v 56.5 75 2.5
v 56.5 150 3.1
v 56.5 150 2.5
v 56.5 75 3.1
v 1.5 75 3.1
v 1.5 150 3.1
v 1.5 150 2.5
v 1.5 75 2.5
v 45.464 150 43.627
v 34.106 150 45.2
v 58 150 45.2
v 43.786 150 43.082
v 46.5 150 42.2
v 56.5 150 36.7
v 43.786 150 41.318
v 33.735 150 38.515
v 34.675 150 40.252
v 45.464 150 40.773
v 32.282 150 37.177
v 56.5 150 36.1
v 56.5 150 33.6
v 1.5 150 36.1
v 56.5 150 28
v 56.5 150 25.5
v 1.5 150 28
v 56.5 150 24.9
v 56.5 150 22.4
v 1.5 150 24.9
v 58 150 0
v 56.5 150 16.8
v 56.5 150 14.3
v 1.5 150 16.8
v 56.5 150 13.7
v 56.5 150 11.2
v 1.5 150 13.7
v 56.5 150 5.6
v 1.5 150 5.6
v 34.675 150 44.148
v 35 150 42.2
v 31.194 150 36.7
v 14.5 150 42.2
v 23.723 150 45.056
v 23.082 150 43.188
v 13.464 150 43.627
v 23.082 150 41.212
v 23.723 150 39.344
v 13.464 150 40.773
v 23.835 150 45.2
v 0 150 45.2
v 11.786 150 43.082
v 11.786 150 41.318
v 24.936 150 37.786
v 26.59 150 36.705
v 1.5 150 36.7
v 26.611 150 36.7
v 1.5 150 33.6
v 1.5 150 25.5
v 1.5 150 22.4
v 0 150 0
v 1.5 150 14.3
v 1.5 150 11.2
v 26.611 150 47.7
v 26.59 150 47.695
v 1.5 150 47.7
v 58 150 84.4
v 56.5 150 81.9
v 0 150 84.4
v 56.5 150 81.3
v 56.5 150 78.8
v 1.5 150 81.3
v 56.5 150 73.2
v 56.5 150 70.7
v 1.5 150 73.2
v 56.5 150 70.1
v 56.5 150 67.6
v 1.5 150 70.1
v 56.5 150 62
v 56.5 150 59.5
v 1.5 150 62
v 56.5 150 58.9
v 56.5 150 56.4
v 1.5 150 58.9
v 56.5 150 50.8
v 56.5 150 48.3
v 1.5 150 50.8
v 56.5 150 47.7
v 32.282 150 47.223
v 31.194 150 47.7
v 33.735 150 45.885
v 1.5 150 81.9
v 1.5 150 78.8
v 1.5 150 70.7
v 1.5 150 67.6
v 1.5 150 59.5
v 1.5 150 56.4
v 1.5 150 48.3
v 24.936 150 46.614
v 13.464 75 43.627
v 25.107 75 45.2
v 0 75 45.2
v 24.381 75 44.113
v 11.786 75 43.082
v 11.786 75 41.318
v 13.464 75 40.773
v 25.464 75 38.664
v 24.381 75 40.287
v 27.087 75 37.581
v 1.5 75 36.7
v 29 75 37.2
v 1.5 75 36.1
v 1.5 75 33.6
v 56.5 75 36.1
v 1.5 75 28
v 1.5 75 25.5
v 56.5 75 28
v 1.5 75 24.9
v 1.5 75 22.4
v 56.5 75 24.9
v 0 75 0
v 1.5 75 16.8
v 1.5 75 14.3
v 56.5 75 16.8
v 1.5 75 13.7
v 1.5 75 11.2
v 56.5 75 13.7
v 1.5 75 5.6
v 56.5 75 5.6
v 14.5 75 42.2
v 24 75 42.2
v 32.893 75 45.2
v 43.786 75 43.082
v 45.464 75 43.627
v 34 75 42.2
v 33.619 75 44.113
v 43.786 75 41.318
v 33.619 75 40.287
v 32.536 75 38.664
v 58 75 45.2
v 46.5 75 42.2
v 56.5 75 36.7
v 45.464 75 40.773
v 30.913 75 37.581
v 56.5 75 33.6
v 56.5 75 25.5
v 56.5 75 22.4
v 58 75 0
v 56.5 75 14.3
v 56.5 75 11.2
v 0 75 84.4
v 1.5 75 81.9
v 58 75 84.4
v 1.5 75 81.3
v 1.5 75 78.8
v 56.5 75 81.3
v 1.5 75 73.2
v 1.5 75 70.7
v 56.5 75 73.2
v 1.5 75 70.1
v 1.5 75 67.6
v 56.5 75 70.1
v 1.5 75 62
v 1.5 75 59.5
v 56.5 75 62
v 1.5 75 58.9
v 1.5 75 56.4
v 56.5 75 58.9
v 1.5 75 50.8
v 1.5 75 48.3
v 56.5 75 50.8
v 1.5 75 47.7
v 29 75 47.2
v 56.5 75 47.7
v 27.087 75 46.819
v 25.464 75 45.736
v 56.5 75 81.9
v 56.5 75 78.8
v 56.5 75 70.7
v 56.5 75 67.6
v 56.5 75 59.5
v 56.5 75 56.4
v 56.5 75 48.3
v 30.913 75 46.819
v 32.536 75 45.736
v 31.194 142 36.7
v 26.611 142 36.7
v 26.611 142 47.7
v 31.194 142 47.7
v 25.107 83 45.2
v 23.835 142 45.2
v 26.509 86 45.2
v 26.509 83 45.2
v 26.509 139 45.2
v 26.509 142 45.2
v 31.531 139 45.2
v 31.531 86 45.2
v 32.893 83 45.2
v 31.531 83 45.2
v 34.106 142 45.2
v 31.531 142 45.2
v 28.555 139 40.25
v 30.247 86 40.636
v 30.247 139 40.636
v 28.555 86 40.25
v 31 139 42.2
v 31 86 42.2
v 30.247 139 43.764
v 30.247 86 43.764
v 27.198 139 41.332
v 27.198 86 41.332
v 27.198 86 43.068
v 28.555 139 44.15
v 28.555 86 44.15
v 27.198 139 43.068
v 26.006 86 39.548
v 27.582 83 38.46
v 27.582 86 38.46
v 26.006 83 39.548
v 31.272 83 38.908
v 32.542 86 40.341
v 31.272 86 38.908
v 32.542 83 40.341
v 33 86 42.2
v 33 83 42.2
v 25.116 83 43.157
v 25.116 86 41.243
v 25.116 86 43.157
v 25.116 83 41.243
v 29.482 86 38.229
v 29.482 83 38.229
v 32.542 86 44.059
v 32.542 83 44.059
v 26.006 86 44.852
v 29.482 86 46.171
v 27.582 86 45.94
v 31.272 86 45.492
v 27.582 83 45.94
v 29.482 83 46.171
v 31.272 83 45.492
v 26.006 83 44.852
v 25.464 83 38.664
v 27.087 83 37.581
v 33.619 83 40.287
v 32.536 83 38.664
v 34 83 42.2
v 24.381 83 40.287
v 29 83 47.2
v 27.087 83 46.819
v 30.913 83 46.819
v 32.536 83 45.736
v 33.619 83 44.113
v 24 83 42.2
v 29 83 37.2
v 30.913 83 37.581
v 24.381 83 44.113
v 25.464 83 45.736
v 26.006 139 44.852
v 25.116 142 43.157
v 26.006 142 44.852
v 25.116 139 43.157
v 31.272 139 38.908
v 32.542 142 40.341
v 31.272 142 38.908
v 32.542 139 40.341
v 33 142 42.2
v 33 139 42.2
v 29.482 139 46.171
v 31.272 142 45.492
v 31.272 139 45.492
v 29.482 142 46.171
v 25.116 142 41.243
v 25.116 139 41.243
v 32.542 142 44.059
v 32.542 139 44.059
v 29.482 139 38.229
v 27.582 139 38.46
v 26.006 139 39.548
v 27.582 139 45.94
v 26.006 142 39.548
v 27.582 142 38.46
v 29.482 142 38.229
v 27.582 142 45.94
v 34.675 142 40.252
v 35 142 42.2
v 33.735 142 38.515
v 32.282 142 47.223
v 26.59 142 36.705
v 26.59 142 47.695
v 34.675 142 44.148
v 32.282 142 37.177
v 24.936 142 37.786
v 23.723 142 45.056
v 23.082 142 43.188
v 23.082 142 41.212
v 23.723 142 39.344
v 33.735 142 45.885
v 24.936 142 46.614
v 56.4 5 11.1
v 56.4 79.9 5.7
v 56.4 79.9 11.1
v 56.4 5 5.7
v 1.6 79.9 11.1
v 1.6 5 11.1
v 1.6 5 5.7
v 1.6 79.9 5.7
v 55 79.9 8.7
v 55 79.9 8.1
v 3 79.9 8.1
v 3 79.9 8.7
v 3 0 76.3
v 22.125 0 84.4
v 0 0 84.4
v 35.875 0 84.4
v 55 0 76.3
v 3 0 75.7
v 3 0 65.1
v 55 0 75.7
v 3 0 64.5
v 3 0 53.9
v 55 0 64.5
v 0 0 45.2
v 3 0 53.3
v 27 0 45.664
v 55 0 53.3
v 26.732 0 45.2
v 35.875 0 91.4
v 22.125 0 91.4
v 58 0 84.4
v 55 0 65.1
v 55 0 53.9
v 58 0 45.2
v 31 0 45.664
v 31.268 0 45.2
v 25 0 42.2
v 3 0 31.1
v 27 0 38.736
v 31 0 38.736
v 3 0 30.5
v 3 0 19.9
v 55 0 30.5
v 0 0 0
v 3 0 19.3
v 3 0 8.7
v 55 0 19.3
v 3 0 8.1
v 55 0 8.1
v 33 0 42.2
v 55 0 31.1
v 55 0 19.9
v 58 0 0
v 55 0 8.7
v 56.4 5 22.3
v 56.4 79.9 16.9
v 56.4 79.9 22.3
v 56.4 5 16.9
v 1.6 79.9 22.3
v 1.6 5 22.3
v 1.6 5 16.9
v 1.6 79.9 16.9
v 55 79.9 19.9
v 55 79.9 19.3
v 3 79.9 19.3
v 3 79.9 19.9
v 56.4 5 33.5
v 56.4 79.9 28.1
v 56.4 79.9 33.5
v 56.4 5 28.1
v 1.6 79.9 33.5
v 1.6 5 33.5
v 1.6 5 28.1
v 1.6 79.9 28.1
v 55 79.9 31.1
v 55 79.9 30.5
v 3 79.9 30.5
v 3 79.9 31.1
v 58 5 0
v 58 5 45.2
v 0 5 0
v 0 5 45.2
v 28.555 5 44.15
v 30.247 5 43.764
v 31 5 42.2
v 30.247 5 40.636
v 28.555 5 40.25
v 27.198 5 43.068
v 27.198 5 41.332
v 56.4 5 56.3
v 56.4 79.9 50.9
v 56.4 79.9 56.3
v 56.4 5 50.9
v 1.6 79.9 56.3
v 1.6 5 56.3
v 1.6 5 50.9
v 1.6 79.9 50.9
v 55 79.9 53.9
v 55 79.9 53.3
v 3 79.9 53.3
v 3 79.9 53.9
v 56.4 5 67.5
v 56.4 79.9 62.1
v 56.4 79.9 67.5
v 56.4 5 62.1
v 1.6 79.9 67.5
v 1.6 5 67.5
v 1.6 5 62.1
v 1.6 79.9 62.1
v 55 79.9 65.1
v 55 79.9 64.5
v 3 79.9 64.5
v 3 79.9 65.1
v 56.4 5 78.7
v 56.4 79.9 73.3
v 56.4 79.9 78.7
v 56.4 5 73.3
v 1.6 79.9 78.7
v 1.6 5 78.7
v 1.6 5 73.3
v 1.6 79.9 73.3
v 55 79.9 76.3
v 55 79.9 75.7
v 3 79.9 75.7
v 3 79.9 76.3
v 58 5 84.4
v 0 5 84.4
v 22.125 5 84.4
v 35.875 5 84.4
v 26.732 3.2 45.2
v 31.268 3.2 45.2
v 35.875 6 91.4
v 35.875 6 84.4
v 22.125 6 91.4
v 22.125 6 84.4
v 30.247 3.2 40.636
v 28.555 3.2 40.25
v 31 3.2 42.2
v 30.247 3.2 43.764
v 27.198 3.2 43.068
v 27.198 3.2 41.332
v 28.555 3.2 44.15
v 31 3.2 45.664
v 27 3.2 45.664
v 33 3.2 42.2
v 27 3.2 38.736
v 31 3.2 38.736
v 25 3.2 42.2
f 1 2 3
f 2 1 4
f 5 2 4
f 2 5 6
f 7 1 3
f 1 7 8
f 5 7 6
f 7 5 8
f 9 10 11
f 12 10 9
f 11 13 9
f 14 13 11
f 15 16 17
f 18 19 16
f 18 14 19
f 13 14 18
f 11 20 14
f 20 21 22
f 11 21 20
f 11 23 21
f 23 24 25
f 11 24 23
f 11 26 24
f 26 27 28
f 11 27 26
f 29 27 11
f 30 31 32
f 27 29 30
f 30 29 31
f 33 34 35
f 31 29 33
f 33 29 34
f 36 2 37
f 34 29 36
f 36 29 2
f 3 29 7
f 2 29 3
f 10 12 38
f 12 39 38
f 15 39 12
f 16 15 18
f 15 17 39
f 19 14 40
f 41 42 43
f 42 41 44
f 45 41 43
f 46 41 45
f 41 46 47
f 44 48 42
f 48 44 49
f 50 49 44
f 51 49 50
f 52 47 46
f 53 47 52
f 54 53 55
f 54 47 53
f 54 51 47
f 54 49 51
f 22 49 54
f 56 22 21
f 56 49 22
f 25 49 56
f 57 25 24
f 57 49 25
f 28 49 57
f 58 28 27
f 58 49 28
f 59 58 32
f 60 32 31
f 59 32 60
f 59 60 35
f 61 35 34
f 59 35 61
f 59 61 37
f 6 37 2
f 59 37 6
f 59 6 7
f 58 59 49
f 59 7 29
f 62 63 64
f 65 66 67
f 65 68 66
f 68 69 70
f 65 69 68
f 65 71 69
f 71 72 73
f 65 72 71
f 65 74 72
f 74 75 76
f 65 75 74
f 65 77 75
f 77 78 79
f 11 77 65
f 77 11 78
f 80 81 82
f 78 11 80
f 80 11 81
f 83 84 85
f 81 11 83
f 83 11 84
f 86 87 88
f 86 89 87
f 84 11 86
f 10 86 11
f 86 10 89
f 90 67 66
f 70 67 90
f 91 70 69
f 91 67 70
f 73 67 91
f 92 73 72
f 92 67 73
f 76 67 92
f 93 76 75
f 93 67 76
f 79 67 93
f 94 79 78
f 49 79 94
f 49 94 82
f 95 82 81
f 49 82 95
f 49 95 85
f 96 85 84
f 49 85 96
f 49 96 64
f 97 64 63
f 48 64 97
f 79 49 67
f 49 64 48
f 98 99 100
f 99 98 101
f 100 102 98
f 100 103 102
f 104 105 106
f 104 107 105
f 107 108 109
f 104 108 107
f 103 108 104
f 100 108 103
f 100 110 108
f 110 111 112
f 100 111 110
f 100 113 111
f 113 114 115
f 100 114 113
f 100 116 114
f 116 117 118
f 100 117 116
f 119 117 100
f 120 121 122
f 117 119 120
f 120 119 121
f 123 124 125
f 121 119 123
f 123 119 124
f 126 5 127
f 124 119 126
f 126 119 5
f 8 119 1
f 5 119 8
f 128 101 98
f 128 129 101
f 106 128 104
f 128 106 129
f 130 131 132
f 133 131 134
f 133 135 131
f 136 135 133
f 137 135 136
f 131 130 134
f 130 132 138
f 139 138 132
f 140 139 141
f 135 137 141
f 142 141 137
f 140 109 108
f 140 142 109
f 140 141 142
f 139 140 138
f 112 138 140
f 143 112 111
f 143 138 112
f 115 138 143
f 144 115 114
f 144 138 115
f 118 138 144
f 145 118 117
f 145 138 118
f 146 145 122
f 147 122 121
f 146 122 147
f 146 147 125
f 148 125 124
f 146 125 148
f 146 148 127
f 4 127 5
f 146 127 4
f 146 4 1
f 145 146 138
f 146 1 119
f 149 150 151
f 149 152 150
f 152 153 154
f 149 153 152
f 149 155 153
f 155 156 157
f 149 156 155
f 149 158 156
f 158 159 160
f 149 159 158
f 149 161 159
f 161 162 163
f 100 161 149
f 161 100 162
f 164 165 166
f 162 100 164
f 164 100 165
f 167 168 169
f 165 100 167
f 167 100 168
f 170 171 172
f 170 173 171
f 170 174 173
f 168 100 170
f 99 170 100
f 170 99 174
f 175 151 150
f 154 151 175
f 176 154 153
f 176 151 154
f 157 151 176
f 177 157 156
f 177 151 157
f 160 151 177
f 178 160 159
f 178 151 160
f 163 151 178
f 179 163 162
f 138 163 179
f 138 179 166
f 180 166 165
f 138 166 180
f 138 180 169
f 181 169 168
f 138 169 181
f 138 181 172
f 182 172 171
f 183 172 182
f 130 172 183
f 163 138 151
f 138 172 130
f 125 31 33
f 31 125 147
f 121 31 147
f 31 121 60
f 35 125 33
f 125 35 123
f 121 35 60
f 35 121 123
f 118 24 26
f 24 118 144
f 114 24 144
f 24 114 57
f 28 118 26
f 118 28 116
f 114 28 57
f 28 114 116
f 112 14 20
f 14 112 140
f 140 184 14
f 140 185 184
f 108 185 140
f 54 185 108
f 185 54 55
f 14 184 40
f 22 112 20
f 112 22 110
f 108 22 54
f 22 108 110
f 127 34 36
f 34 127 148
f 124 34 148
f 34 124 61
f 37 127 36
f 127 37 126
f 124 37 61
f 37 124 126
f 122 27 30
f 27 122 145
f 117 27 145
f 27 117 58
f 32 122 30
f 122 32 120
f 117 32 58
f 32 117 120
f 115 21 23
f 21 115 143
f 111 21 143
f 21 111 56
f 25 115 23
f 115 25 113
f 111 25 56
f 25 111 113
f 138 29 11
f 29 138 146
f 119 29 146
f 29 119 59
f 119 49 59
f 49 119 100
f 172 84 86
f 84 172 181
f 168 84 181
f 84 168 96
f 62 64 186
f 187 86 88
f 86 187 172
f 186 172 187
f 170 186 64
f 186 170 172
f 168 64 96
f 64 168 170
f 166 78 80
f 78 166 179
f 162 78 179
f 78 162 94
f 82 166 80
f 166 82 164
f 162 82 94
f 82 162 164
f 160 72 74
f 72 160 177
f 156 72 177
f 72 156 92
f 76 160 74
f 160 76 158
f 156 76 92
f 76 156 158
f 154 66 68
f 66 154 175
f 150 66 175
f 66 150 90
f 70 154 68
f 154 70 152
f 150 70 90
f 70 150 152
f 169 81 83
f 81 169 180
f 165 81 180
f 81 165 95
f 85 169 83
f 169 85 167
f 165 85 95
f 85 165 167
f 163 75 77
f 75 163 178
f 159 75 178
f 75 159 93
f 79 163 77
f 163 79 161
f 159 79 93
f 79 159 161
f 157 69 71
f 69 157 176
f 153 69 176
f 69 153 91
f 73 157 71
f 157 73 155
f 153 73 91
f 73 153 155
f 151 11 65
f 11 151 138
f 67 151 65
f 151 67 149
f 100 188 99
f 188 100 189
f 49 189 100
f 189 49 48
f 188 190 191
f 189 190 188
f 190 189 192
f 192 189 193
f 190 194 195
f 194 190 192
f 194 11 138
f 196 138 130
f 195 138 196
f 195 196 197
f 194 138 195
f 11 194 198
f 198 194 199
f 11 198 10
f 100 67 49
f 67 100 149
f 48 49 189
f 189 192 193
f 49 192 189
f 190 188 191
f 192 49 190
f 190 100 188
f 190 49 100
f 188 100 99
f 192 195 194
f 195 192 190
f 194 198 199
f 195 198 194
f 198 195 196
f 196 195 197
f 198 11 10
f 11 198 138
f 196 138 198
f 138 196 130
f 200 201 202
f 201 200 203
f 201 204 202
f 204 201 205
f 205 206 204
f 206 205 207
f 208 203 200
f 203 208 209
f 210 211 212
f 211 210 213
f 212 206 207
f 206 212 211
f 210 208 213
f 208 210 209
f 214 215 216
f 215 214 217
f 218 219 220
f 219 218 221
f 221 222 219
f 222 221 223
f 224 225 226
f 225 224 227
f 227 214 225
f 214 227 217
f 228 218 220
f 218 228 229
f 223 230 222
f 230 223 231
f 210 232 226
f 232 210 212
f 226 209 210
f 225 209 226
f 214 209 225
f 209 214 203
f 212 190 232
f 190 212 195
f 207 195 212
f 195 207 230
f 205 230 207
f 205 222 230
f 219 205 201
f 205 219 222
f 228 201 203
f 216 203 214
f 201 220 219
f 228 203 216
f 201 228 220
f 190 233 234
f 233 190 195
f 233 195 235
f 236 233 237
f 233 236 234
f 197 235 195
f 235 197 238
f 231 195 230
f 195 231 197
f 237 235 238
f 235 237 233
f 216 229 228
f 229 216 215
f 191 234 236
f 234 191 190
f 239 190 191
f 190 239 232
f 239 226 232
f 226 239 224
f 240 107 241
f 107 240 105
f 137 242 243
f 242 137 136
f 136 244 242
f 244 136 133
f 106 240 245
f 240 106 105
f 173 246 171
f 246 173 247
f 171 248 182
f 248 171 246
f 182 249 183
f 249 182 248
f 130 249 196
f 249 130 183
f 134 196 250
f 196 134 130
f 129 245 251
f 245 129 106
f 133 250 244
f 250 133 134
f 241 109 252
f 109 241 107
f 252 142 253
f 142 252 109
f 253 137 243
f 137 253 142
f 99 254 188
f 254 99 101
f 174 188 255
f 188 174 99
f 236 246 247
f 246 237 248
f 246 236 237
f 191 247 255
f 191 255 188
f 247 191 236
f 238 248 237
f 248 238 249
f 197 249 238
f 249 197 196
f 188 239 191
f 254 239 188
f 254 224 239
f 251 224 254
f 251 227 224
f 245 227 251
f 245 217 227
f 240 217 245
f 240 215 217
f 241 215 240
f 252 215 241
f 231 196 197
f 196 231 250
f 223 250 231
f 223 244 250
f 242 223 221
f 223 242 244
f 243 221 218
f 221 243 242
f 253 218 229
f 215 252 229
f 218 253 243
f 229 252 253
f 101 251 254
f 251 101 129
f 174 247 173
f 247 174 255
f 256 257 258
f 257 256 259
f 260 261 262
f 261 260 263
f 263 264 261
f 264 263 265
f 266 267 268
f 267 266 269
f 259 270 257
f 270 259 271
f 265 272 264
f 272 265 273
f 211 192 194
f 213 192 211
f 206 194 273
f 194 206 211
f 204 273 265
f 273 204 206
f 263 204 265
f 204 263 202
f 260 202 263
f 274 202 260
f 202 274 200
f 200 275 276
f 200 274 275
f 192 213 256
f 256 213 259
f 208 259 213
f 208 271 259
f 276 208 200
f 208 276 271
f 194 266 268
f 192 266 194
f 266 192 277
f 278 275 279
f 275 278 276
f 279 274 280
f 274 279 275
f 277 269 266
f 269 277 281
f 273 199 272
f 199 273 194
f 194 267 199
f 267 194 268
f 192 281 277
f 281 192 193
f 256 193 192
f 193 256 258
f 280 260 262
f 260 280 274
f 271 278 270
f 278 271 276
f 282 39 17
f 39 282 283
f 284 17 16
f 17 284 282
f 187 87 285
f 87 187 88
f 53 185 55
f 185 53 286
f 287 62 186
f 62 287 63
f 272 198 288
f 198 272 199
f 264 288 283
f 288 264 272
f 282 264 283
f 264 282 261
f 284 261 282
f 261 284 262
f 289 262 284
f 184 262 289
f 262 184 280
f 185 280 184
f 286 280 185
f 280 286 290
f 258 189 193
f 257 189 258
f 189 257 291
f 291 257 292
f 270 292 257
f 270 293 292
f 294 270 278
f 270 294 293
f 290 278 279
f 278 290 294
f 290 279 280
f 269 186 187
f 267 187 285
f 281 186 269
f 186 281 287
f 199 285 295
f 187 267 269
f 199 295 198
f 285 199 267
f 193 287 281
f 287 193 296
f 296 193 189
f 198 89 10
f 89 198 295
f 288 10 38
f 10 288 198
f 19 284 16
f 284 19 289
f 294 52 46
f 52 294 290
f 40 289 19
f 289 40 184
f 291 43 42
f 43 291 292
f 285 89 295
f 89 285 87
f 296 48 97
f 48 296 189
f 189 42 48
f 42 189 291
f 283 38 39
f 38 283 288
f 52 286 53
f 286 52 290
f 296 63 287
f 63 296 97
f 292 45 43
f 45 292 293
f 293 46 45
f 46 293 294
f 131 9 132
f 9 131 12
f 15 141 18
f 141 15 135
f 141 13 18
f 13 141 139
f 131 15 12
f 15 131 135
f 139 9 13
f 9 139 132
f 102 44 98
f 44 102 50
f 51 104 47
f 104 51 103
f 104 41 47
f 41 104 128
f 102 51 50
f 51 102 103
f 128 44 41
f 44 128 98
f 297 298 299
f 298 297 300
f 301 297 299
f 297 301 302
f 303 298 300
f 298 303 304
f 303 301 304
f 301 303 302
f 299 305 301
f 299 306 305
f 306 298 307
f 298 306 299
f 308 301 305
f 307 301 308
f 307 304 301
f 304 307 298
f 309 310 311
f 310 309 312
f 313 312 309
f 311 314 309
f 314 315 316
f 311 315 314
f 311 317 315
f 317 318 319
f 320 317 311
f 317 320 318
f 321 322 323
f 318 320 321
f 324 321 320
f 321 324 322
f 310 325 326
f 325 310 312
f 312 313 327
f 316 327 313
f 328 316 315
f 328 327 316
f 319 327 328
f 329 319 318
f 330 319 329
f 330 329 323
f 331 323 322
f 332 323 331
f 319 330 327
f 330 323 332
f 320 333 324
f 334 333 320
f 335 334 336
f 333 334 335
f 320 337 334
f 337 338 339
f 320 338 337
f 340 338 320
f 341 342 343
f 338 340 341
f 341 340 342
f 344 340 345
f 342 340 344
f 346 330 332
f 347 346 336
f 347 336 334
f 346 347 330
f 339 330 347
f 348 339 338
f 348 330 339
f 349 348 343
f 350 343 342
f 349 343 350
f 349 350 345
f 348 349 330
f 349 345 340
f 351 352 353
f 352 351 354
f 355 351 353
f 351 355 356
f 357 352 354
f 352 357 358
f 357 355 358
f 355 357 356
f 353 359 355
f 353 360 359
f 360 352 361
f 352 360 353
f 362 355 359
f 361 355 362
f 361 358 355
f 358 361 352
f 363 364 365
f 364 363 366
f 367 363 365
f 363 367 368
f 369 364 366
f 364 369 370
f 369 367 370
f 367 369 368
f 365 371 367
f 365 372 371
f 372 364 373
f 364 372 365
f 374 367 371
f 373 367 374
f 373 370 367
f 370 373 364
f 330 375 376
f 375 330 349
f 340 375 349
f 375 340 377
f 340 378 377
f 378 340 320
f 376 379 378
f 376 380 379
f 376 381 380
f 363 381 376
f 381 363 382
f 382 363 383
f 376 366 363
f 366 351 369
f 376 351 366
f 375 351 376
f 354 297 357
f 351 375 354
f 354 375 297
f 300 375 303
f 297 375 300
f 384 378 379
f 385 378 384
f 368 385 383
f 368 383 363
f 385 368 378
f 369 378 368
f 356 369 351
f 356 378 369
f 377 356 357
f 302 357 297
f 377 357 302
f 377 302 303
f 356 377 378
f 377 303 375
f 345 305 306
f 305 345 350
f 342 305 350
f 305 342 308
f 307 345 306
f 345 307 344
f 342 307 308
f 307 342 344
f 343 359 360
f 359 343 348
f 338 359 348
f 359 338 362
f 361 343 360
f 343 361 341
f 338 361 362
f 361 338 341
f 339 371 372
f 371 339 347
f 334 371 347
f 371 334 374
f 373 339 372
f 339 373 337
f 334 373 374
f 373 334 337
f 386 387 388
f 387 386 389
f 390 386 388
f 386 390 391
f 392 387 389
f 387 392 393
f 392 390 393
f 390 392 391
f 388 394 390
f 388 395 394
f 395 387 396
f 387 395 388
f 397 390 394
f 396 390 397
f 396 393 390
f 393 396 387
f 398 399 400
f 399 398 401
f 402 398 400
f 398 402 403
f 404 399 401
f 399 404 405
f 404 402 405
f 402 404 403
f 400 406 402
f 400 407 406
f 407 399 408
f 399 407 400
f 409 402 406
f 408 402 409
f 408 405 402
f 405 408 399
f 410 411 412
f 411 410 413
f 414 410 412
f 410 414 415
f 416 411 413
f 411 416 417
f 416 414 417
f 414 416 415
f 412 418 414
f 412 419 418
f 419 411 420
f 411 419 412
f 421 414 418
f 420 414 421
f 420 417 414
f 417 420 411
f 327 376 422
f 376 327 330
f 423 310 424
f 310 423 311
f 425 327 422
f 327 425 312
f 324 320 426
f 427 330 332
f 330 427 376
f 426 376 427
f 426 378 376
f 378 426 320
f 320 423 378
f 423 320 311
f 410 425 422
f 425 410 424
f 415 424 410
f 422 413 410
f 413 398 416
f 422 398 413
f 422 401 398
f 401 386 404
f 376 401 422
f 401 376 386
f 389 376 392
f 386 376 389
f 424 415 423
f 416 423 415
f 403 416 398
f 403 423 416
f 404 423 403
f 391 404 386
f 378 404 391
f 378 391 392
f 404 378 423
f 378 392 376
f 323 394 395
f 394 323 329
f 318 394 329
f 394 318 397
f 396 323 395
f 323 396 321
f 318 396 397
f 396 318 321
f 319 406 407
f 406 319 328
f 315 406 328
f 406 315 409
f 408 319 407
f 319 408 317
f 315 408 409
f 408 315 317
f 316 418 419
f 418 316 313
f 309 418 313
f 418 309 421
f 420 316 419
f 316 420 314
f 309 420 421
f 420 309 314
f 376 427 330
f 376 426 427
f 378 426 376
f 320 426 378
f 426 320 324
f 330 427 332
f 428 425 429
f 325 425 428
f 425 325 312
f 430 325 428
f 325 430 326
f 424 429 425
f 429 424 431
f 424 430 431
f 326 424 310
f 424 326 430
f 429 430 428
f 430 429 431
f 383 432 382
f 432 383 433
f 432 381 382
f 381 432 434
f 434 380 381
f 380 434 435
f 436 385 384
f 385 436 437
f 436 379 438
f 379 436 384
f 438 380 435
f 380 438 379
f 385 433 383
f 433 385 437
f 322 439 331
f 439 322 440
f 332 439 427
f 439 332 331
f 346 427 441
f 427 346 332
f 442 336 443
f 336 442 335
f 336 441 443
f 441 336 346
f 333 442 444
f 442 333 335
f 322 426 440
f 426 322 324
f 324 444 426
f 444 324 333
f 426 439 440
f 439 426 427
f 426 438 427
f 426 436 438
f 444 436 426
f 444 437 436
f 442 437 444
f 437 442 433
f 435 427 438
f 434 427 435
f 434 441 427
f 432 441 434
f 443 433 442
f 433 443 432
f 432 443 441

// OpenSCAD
/* [Main Parameters] */

// count of all plates in capacitor
plate_count_ = 13;           // [3, 5, 7, 9, 11, 13, 15, 17, 19, 21, 23, 25]

// distance between rotor and stator capacitor plates in mm
plate_distance_ = 5;         // [2, 3, 4, 5, 6, 7, 8]

// capacitor plate width
plate_width_ = 55;

// capacitor plate height
plate_depth_ = 75;

// capacitor plate hole height, use larger value to make some room
plate_height_ = 0.6;

// gap between rotor and stator, tune for smoother sliding by printing tiny capacitor first, use acetone bath!
sliding_gap_ = 0.1;

// capacitor element to generate
generate_element_ = "stator";       // [stator, rotor]

// generate both stator and rotor for demo purposes?
generate_both_demo_ = "yes";        // [yes, no]

// enable worm gear system?
enable_worm_gear_ = "yes";          // [yes, no]

// enable button pusher?
enable_rotor_button_pusher_ = "yes";    // [yes, no]

/* [Worm Gear Parameters] */

// how much space to provide for worm gear system
worm_gear_gap_ = 6;

// worm shaft radius, change if use other than M4 shaft
worm_shaft_radius_ = 2;     // [1, 1.5, 2, 2.5, 3]

// bearing outer radius
bearing_radius_ = 4;

// bearing size depth/height
bearing_depth_ = 3;

// hole for screws, use larger diameter so tool will fit
screw_hole_radius_ = 6;

// depth of hole for screw, change based on shaft, number of nuts
screw_hole_depth_ = 8;

// hole sizes for stepper holder screws
holder_screw_radius_ = 1.5;

// distance from the shaft to the the motor holding screws
holder_screw_center_distance_ = 16;

// height of rotor button pusher    
button_pusher_height_ = 7;

// hole depth for holding nut on the rotor, change based on shaft, M3/M4/etc
nut_cutout_depth_ = 3.2;

// holding nut radius on the rotor, change based on shaft, M3/M4/etc
nut_cutout_radius_ = 4;
    
/* [Advanced Parameters] */

// gap between plate edge and stator edge
plate_width_guard_ = 1.5;

// depth of rotor base plate
rotor_base_plate_depth_ = 5;

assert(plate_count_ % 2 == 1, "Plate count must be an odd number");

echo("maximum capacitance: ~", capacitor_value_pf(plate_width_, plate_depth_, plate_count_, plate_distance_), "pF");
echo("breakdown voltage for air: ", breakdown_voltage_kv(3, plate_distance_), "kV");
echo("breakdown voltage for PETG: ", breakdown_voltage_kv(4.5, plate_distance_), "kV");

if (enable_worm_gear_ == "yes")
{
    assert(plate_count_ % 4 == 1, "Wrong plate count, must be one of [5, 9, 13, 17, 21, 25]");
    capacitor_with_worm_gear(plate_count_, plate_distance_, plate_width_, 
        plate_depth_, plate_height_, sliding_gap_, generate_element_, 
        generate_both_demo_, worm_gear_gap_, enable_rotor_button_pusher_);
} else 
{
    capacitor_naked(plate_count_, plate_distance_, plate_width_, 
        plate_depth_, plate_height_, sliding_gap_, generate_element_, generate_both_demo_);
}

// calculate capacitor breakdown voltage
function breakdown_voltage_kv(breakdown_voltage_mm, plate_distance) = plate_distance * breakdown_voltage_mm;

// calculate ~20% infill PETG filament approximate capacitor value from dimensions in mm and plate count
function capacitor_value_pf(plate_width, plate_depth, plate_count, plate_distance) =
    let (dielectric_constant = 1.55, electrostatic_constant = 8.854e-12)
        (plate_count - 1) * dielectric_constant * electrostatic_constant * plate_width * plate_depth / plate_distance * 1e9;

// generate capacitor with worm gear
module capacitor_with_worm_gear(plate_count, plate_distance, plate_width, 
    plate_depth, plate_height, sliding_gap, generate_element, generate_both_demo, 
    worm_gear_gap, enable_rotor_button_pusher)
{
    if (generate_element == "stator" || generate_both_demo == "yes") 
    {
        translate([0, 75, 0])
            capacitor_stator_with_worm_gear(plate_count, plate_distance, 
                plate_width, plate_depth, plate_height, worm_gear_gap);
    }
    if (generate_element == "rotor" || generate_both_demo == "yes") 
    {
        color("green")
            capacitor_rotor_with_worm_gear(plate_count, plate_distance, 
                plate_width, plate_depth, plate_height, sliding_gap, worm_gear_gap, enable_rotor_button_pusher);
    }
}

// generate capacitor
module capacitor_naked(plate_count, plate_distance, plate_width, 
    plate_depth, plate_height, sliding_gap, generate_element, generate_both_demo)
{
    if (generate_element == "stator" || generate_both_demo == "yes") 
    {
        translate([0, 50, 0])
            capacitor_stator(plate_count, plate_distance, 
                plate_width, plate_depth, plate_height);
    }
    if (generate_element == "rotor" || generate_both_demo == "yes") 
    {
        color("green")
            capacitor_rotor(plate_count, plate_distance, 
                plate_width, plate_depth, plate_height, sliding_gap);
    }
}

// generate stator with worm gear support
module capacitor_stator_with_worm_gear(plate_count, plate_distance, 
    plate_width, plate_depth, plate_height, worm_gear_gap)
{
    plate_width_guard = plate_width_guard_;
    worm_shaft_radius = worm_shaft_radius_;
    bearing_radius = bearing_radius_;
    bearing_depth = bearing_depth_;
    screw_hole_radius = screw_hole_radius_;
    screw_hole_depth = screw_hole_depth_;
    holder_screw_radius = holder_screw_radius_;
    holder_screw_center_distance = holder_screw_center_distance_;
    
    holder_screw_depth = plate_depth;
    bearing_full_depth = bearing_depth + screw_hole_depth;
    half_plate_count = ceil(plate_count / 2.0);
    box_height = half_plate_count * (plate_distance + plate_height);
    box_height_center = box_height + worm_gear_gap / 2.0;
    box_width_center = plate_width / 2.0 + plate_width_guard;
    
    difference()
    {
        // stator body with holes
        union()
        {
            // two split capacitor stators
            translate([0, 0, 0])
                capacitor_stator(half_plate_count, plate_distance, plate_width, plate_depth, plate_height);
            translate([0, 0, box_height + worm_gear_gap])
                capacitor_stator(half_plate_count, plate_distance, plate_width, plate_depth, plate_height);
            
            // worm gear blade hole
            translate([0, 0, box_height])
                cube([plate_width + 2 * plate_width_guard, plate_depth, worm_gear_gap]);
        }
        
        // worm gear system
        translate([plate_width / 2.0 + plate_width_guard, 0, box_height_center])
            rotate([-90, 0, 0])
                union() 
                {
                    cylinder(plate_depth, r=worm_shaft_radius);
                    cylinder(bearing_full_depth, r=bearing_radius);
                    cylinder(screw_hole_depth, r=bearing_radius + 1);
                }
        translate([box_width_center, plate_depth - bearing_full_depth, box_height_center])
            rotate([-90, 0, 0])
                cylinder(bearing_full_depth, r=bearing_radius);
        translate([box_width_center, plate_depth - screw_hole_depth, box_height_center])
            rotate([-90, 0, 0])
                cylinder(screw_hole_depth, r=screw_hole_radius);

        // holder holes
        translate([box_width_center + holder_screw_center_distance, plate_depth - holder_screw_depth, box_height_center])
            rotate([-90, 0, 0])
                cylinder(holder_screw_depth, r=holder_screw_radius);
        translate([box_width_center - holder_screw_center_distance, plate_depth - holder_screw_depth, box_height_center])
            rotate([-90, 0, 0])
                cylinder(holder_screw_depth, r=holder_screw_radius);
    }
}

// generate rotor with worm gear support
module capacitor_rotor_with_worm_gear(plate_count, plate_distance, 
    plate_width, plate_depth, plate_height, sliding_gap, 
    worm_gear_gap, enable_rotor_button_pusher)
{
    plate_width_guard = plate_width_guard_;
    worm_shaft_radius = worm_shaft_radius_;
    base_plate_width = rotor_base_plate_depth_;
    nut_cutout_depth = nut_cutout_depth_;
    nut_cutout_radius = nut_cutout_radius_;
    button_pusher_height = button_pusher_height_;

    half_plate_count = ceil(plate_count / 2.0);
    
    box_height = half_plate_count * (plate_distance + plate_height);
    box_height_center = box_height + worm_gear_gap / 2.0;
    box_width_center = plate_width / 2.0 + plate_width_guard;
    
    button_pusher_height_pos = 2 * box_height + worm_gear_gap;
    button_pusher_width = plate_width / 4.0;
    button_pusher_width_center = box_width_center - button_pusher_width / 2.0;
    button_pusher_depth = worm_gear_gap;

    difference()
    {
        // rotor body with blades
        union()
        {
            // two split capacitor rotors
            translate([0, 0, 0])
                capacitor_rotor(half_plate_count, plate_distance, plate_width, 
                    plate_depth, plate_height, sliding_gap);
            translate([0, 0, box_height + worm_gear_gap])
                capacitor_rotor(half_plate_count, plate_distance, plate_width, 
                    plate_depth, plate_height, sliding_gap);
            
            // worm gear blade
            translate([0, 0, box_height])
                cube([plate_width + 2 * plate_width_guard, base_plate_width, worm_gear_gap]);

            if (enable_rotor_button_pusher == "yes") 
            {
                translate([button_pusher_width_center, 0, button_pusher_height_pos])
                    cube([button_pusher_width, button_pusher_depth, button_pusher_height]);
            }
        }

        // worm gear hole
        translate([box_width_center, 0, box_height_center])
            rotate([-90, 0, 0])
                cylinder(base_plate_width, r=worm_shaft_radius);

        // nut cutout
        translate([box_width_center, 0, box_height_center])
            rotate([-90, 0, 0])
                cylinder(r=nut_cutout_radius, h=nut_cutout_depth, $fn=6);
    }
}

// generate sliding capacitor stator
module capacitor_stator(plate_count, plate_distance, plate_width, plate_depth, plate_height) 
{
    plate_width_guard = plate_width_guard_;

    // calculated dimensions
    box_width = plate_width + (plate_width_guard * 2);
    box_depth = plate_depth;
    box_height = plate_count * plate_distance + plate_count * plate_height;

    echo("stator dimensions:", box_width, box_depth, box_height);

    stator_plate_count = ceil(plate_count / 2.0);
    stator_plate_distance = 2 * (plate_distance + plate_height);
    stator_plate_initial_height = plate_distance / 2.0;

    echo("stator plates:", stator_plate_distance, stator_plate_initial_height);

    stator_hole_count = floor(plate_count / 2.0);
    stator_hole_distance = stator_plate_distance;
    stator_hole_initial_height = plate_distance + plate_height;
    stator_hole_height = plate_distance + plate_height;

    echo("stator holes:", stator_hole_distance, stator_hole_initial_height);

    difference() 
    {
        // stator body
        cube([box_width, box_depth, box_height]);

        // holes for plates
        for (plate_num = [0:stator_plate_count - 1]) 
        {
            translate([plate_width_guard, 0, plate_num * stator_plate_distance + stator_plate_initial_height])
                cube([plate_width, plate_depth, plate_height]);
        }
        
        // holes for rotor blades
        for (plate_num = [0:stator_hole_count - 1]) 
        {
            translate([plate_width_guard, 0, plate_num * stator_hole_distance + stator_hole_initial_height])
                cube([plate_width, plate_depth, stator_hole_height]);
        }
    }
}

// generate sliding capacitor rotor
module capacitor_rotor(plate_count, plate_distance, plate_width, plate_depth, plate_height, sliding_gap) 
{
    plate_width_guard = plate_width_guard_;

    // calculated dimensions
    box_width = plate_width + (plate_width_guard * 2);
    box_depth = rotor_base_plate_depth_;
    box_height = plate_count * plate_distance + plate_count * plate_height;

    echo("rotor dimensions:", box_width, box_depth, box_height);

    rotor_plate_count = ceil(plate_count / 2.0);
    rotor_plate_distance = 2 * (plate_distance + plate_height);
    rotor_plate_initial_height = plate_distance + plate_height + plate_distance / 2.0;

    echo("rotor plates:", rotor_plate_distance, rotor_plate_initial_height);

    rotor_blade_count = floor(plate_count / 2.0);
    rotor_blade_distance = rotor_plate_distance;
    rotor_blade_initial_height = plate_distance + plate_height + sliding_gap;
    rotor_blade_height = plate_distance + plate_height - 2 * sliding_gap;

    echo("rotor blades:", rotor_blade_distance, rotor_blade_initial_height);

    difference() 
    {
        // rotor body
        union() 
        {
            // rotor base plate
            cube([box_width, box_depth, box_height]);
            
            // rotor blades
            for (plate_num = [0:rotor_blade_count - 1]) 
            {
                translate([plate_width_guard + sliding_gap, 0, plate_num * rotor_blade_distance + rotor_blade_initial_height])
                    cube([plate_width - 2 * sliding_gap, plate_depth + box_depth - sliding_gap, rotor_blade_height]);
            }
        }
        
        // rotor plates 
        for (plate_num = [0:rotor_plate_count - 1]) 
        {
            translate([2 * plate_width_guard, 0, plate_num * rotor_plate_distance + rotor_plate_initial_height])
                cube([plate_width - 2 * plate_width_guard, plate_depth + box_depth, plate_height]);
        }
    }
}
